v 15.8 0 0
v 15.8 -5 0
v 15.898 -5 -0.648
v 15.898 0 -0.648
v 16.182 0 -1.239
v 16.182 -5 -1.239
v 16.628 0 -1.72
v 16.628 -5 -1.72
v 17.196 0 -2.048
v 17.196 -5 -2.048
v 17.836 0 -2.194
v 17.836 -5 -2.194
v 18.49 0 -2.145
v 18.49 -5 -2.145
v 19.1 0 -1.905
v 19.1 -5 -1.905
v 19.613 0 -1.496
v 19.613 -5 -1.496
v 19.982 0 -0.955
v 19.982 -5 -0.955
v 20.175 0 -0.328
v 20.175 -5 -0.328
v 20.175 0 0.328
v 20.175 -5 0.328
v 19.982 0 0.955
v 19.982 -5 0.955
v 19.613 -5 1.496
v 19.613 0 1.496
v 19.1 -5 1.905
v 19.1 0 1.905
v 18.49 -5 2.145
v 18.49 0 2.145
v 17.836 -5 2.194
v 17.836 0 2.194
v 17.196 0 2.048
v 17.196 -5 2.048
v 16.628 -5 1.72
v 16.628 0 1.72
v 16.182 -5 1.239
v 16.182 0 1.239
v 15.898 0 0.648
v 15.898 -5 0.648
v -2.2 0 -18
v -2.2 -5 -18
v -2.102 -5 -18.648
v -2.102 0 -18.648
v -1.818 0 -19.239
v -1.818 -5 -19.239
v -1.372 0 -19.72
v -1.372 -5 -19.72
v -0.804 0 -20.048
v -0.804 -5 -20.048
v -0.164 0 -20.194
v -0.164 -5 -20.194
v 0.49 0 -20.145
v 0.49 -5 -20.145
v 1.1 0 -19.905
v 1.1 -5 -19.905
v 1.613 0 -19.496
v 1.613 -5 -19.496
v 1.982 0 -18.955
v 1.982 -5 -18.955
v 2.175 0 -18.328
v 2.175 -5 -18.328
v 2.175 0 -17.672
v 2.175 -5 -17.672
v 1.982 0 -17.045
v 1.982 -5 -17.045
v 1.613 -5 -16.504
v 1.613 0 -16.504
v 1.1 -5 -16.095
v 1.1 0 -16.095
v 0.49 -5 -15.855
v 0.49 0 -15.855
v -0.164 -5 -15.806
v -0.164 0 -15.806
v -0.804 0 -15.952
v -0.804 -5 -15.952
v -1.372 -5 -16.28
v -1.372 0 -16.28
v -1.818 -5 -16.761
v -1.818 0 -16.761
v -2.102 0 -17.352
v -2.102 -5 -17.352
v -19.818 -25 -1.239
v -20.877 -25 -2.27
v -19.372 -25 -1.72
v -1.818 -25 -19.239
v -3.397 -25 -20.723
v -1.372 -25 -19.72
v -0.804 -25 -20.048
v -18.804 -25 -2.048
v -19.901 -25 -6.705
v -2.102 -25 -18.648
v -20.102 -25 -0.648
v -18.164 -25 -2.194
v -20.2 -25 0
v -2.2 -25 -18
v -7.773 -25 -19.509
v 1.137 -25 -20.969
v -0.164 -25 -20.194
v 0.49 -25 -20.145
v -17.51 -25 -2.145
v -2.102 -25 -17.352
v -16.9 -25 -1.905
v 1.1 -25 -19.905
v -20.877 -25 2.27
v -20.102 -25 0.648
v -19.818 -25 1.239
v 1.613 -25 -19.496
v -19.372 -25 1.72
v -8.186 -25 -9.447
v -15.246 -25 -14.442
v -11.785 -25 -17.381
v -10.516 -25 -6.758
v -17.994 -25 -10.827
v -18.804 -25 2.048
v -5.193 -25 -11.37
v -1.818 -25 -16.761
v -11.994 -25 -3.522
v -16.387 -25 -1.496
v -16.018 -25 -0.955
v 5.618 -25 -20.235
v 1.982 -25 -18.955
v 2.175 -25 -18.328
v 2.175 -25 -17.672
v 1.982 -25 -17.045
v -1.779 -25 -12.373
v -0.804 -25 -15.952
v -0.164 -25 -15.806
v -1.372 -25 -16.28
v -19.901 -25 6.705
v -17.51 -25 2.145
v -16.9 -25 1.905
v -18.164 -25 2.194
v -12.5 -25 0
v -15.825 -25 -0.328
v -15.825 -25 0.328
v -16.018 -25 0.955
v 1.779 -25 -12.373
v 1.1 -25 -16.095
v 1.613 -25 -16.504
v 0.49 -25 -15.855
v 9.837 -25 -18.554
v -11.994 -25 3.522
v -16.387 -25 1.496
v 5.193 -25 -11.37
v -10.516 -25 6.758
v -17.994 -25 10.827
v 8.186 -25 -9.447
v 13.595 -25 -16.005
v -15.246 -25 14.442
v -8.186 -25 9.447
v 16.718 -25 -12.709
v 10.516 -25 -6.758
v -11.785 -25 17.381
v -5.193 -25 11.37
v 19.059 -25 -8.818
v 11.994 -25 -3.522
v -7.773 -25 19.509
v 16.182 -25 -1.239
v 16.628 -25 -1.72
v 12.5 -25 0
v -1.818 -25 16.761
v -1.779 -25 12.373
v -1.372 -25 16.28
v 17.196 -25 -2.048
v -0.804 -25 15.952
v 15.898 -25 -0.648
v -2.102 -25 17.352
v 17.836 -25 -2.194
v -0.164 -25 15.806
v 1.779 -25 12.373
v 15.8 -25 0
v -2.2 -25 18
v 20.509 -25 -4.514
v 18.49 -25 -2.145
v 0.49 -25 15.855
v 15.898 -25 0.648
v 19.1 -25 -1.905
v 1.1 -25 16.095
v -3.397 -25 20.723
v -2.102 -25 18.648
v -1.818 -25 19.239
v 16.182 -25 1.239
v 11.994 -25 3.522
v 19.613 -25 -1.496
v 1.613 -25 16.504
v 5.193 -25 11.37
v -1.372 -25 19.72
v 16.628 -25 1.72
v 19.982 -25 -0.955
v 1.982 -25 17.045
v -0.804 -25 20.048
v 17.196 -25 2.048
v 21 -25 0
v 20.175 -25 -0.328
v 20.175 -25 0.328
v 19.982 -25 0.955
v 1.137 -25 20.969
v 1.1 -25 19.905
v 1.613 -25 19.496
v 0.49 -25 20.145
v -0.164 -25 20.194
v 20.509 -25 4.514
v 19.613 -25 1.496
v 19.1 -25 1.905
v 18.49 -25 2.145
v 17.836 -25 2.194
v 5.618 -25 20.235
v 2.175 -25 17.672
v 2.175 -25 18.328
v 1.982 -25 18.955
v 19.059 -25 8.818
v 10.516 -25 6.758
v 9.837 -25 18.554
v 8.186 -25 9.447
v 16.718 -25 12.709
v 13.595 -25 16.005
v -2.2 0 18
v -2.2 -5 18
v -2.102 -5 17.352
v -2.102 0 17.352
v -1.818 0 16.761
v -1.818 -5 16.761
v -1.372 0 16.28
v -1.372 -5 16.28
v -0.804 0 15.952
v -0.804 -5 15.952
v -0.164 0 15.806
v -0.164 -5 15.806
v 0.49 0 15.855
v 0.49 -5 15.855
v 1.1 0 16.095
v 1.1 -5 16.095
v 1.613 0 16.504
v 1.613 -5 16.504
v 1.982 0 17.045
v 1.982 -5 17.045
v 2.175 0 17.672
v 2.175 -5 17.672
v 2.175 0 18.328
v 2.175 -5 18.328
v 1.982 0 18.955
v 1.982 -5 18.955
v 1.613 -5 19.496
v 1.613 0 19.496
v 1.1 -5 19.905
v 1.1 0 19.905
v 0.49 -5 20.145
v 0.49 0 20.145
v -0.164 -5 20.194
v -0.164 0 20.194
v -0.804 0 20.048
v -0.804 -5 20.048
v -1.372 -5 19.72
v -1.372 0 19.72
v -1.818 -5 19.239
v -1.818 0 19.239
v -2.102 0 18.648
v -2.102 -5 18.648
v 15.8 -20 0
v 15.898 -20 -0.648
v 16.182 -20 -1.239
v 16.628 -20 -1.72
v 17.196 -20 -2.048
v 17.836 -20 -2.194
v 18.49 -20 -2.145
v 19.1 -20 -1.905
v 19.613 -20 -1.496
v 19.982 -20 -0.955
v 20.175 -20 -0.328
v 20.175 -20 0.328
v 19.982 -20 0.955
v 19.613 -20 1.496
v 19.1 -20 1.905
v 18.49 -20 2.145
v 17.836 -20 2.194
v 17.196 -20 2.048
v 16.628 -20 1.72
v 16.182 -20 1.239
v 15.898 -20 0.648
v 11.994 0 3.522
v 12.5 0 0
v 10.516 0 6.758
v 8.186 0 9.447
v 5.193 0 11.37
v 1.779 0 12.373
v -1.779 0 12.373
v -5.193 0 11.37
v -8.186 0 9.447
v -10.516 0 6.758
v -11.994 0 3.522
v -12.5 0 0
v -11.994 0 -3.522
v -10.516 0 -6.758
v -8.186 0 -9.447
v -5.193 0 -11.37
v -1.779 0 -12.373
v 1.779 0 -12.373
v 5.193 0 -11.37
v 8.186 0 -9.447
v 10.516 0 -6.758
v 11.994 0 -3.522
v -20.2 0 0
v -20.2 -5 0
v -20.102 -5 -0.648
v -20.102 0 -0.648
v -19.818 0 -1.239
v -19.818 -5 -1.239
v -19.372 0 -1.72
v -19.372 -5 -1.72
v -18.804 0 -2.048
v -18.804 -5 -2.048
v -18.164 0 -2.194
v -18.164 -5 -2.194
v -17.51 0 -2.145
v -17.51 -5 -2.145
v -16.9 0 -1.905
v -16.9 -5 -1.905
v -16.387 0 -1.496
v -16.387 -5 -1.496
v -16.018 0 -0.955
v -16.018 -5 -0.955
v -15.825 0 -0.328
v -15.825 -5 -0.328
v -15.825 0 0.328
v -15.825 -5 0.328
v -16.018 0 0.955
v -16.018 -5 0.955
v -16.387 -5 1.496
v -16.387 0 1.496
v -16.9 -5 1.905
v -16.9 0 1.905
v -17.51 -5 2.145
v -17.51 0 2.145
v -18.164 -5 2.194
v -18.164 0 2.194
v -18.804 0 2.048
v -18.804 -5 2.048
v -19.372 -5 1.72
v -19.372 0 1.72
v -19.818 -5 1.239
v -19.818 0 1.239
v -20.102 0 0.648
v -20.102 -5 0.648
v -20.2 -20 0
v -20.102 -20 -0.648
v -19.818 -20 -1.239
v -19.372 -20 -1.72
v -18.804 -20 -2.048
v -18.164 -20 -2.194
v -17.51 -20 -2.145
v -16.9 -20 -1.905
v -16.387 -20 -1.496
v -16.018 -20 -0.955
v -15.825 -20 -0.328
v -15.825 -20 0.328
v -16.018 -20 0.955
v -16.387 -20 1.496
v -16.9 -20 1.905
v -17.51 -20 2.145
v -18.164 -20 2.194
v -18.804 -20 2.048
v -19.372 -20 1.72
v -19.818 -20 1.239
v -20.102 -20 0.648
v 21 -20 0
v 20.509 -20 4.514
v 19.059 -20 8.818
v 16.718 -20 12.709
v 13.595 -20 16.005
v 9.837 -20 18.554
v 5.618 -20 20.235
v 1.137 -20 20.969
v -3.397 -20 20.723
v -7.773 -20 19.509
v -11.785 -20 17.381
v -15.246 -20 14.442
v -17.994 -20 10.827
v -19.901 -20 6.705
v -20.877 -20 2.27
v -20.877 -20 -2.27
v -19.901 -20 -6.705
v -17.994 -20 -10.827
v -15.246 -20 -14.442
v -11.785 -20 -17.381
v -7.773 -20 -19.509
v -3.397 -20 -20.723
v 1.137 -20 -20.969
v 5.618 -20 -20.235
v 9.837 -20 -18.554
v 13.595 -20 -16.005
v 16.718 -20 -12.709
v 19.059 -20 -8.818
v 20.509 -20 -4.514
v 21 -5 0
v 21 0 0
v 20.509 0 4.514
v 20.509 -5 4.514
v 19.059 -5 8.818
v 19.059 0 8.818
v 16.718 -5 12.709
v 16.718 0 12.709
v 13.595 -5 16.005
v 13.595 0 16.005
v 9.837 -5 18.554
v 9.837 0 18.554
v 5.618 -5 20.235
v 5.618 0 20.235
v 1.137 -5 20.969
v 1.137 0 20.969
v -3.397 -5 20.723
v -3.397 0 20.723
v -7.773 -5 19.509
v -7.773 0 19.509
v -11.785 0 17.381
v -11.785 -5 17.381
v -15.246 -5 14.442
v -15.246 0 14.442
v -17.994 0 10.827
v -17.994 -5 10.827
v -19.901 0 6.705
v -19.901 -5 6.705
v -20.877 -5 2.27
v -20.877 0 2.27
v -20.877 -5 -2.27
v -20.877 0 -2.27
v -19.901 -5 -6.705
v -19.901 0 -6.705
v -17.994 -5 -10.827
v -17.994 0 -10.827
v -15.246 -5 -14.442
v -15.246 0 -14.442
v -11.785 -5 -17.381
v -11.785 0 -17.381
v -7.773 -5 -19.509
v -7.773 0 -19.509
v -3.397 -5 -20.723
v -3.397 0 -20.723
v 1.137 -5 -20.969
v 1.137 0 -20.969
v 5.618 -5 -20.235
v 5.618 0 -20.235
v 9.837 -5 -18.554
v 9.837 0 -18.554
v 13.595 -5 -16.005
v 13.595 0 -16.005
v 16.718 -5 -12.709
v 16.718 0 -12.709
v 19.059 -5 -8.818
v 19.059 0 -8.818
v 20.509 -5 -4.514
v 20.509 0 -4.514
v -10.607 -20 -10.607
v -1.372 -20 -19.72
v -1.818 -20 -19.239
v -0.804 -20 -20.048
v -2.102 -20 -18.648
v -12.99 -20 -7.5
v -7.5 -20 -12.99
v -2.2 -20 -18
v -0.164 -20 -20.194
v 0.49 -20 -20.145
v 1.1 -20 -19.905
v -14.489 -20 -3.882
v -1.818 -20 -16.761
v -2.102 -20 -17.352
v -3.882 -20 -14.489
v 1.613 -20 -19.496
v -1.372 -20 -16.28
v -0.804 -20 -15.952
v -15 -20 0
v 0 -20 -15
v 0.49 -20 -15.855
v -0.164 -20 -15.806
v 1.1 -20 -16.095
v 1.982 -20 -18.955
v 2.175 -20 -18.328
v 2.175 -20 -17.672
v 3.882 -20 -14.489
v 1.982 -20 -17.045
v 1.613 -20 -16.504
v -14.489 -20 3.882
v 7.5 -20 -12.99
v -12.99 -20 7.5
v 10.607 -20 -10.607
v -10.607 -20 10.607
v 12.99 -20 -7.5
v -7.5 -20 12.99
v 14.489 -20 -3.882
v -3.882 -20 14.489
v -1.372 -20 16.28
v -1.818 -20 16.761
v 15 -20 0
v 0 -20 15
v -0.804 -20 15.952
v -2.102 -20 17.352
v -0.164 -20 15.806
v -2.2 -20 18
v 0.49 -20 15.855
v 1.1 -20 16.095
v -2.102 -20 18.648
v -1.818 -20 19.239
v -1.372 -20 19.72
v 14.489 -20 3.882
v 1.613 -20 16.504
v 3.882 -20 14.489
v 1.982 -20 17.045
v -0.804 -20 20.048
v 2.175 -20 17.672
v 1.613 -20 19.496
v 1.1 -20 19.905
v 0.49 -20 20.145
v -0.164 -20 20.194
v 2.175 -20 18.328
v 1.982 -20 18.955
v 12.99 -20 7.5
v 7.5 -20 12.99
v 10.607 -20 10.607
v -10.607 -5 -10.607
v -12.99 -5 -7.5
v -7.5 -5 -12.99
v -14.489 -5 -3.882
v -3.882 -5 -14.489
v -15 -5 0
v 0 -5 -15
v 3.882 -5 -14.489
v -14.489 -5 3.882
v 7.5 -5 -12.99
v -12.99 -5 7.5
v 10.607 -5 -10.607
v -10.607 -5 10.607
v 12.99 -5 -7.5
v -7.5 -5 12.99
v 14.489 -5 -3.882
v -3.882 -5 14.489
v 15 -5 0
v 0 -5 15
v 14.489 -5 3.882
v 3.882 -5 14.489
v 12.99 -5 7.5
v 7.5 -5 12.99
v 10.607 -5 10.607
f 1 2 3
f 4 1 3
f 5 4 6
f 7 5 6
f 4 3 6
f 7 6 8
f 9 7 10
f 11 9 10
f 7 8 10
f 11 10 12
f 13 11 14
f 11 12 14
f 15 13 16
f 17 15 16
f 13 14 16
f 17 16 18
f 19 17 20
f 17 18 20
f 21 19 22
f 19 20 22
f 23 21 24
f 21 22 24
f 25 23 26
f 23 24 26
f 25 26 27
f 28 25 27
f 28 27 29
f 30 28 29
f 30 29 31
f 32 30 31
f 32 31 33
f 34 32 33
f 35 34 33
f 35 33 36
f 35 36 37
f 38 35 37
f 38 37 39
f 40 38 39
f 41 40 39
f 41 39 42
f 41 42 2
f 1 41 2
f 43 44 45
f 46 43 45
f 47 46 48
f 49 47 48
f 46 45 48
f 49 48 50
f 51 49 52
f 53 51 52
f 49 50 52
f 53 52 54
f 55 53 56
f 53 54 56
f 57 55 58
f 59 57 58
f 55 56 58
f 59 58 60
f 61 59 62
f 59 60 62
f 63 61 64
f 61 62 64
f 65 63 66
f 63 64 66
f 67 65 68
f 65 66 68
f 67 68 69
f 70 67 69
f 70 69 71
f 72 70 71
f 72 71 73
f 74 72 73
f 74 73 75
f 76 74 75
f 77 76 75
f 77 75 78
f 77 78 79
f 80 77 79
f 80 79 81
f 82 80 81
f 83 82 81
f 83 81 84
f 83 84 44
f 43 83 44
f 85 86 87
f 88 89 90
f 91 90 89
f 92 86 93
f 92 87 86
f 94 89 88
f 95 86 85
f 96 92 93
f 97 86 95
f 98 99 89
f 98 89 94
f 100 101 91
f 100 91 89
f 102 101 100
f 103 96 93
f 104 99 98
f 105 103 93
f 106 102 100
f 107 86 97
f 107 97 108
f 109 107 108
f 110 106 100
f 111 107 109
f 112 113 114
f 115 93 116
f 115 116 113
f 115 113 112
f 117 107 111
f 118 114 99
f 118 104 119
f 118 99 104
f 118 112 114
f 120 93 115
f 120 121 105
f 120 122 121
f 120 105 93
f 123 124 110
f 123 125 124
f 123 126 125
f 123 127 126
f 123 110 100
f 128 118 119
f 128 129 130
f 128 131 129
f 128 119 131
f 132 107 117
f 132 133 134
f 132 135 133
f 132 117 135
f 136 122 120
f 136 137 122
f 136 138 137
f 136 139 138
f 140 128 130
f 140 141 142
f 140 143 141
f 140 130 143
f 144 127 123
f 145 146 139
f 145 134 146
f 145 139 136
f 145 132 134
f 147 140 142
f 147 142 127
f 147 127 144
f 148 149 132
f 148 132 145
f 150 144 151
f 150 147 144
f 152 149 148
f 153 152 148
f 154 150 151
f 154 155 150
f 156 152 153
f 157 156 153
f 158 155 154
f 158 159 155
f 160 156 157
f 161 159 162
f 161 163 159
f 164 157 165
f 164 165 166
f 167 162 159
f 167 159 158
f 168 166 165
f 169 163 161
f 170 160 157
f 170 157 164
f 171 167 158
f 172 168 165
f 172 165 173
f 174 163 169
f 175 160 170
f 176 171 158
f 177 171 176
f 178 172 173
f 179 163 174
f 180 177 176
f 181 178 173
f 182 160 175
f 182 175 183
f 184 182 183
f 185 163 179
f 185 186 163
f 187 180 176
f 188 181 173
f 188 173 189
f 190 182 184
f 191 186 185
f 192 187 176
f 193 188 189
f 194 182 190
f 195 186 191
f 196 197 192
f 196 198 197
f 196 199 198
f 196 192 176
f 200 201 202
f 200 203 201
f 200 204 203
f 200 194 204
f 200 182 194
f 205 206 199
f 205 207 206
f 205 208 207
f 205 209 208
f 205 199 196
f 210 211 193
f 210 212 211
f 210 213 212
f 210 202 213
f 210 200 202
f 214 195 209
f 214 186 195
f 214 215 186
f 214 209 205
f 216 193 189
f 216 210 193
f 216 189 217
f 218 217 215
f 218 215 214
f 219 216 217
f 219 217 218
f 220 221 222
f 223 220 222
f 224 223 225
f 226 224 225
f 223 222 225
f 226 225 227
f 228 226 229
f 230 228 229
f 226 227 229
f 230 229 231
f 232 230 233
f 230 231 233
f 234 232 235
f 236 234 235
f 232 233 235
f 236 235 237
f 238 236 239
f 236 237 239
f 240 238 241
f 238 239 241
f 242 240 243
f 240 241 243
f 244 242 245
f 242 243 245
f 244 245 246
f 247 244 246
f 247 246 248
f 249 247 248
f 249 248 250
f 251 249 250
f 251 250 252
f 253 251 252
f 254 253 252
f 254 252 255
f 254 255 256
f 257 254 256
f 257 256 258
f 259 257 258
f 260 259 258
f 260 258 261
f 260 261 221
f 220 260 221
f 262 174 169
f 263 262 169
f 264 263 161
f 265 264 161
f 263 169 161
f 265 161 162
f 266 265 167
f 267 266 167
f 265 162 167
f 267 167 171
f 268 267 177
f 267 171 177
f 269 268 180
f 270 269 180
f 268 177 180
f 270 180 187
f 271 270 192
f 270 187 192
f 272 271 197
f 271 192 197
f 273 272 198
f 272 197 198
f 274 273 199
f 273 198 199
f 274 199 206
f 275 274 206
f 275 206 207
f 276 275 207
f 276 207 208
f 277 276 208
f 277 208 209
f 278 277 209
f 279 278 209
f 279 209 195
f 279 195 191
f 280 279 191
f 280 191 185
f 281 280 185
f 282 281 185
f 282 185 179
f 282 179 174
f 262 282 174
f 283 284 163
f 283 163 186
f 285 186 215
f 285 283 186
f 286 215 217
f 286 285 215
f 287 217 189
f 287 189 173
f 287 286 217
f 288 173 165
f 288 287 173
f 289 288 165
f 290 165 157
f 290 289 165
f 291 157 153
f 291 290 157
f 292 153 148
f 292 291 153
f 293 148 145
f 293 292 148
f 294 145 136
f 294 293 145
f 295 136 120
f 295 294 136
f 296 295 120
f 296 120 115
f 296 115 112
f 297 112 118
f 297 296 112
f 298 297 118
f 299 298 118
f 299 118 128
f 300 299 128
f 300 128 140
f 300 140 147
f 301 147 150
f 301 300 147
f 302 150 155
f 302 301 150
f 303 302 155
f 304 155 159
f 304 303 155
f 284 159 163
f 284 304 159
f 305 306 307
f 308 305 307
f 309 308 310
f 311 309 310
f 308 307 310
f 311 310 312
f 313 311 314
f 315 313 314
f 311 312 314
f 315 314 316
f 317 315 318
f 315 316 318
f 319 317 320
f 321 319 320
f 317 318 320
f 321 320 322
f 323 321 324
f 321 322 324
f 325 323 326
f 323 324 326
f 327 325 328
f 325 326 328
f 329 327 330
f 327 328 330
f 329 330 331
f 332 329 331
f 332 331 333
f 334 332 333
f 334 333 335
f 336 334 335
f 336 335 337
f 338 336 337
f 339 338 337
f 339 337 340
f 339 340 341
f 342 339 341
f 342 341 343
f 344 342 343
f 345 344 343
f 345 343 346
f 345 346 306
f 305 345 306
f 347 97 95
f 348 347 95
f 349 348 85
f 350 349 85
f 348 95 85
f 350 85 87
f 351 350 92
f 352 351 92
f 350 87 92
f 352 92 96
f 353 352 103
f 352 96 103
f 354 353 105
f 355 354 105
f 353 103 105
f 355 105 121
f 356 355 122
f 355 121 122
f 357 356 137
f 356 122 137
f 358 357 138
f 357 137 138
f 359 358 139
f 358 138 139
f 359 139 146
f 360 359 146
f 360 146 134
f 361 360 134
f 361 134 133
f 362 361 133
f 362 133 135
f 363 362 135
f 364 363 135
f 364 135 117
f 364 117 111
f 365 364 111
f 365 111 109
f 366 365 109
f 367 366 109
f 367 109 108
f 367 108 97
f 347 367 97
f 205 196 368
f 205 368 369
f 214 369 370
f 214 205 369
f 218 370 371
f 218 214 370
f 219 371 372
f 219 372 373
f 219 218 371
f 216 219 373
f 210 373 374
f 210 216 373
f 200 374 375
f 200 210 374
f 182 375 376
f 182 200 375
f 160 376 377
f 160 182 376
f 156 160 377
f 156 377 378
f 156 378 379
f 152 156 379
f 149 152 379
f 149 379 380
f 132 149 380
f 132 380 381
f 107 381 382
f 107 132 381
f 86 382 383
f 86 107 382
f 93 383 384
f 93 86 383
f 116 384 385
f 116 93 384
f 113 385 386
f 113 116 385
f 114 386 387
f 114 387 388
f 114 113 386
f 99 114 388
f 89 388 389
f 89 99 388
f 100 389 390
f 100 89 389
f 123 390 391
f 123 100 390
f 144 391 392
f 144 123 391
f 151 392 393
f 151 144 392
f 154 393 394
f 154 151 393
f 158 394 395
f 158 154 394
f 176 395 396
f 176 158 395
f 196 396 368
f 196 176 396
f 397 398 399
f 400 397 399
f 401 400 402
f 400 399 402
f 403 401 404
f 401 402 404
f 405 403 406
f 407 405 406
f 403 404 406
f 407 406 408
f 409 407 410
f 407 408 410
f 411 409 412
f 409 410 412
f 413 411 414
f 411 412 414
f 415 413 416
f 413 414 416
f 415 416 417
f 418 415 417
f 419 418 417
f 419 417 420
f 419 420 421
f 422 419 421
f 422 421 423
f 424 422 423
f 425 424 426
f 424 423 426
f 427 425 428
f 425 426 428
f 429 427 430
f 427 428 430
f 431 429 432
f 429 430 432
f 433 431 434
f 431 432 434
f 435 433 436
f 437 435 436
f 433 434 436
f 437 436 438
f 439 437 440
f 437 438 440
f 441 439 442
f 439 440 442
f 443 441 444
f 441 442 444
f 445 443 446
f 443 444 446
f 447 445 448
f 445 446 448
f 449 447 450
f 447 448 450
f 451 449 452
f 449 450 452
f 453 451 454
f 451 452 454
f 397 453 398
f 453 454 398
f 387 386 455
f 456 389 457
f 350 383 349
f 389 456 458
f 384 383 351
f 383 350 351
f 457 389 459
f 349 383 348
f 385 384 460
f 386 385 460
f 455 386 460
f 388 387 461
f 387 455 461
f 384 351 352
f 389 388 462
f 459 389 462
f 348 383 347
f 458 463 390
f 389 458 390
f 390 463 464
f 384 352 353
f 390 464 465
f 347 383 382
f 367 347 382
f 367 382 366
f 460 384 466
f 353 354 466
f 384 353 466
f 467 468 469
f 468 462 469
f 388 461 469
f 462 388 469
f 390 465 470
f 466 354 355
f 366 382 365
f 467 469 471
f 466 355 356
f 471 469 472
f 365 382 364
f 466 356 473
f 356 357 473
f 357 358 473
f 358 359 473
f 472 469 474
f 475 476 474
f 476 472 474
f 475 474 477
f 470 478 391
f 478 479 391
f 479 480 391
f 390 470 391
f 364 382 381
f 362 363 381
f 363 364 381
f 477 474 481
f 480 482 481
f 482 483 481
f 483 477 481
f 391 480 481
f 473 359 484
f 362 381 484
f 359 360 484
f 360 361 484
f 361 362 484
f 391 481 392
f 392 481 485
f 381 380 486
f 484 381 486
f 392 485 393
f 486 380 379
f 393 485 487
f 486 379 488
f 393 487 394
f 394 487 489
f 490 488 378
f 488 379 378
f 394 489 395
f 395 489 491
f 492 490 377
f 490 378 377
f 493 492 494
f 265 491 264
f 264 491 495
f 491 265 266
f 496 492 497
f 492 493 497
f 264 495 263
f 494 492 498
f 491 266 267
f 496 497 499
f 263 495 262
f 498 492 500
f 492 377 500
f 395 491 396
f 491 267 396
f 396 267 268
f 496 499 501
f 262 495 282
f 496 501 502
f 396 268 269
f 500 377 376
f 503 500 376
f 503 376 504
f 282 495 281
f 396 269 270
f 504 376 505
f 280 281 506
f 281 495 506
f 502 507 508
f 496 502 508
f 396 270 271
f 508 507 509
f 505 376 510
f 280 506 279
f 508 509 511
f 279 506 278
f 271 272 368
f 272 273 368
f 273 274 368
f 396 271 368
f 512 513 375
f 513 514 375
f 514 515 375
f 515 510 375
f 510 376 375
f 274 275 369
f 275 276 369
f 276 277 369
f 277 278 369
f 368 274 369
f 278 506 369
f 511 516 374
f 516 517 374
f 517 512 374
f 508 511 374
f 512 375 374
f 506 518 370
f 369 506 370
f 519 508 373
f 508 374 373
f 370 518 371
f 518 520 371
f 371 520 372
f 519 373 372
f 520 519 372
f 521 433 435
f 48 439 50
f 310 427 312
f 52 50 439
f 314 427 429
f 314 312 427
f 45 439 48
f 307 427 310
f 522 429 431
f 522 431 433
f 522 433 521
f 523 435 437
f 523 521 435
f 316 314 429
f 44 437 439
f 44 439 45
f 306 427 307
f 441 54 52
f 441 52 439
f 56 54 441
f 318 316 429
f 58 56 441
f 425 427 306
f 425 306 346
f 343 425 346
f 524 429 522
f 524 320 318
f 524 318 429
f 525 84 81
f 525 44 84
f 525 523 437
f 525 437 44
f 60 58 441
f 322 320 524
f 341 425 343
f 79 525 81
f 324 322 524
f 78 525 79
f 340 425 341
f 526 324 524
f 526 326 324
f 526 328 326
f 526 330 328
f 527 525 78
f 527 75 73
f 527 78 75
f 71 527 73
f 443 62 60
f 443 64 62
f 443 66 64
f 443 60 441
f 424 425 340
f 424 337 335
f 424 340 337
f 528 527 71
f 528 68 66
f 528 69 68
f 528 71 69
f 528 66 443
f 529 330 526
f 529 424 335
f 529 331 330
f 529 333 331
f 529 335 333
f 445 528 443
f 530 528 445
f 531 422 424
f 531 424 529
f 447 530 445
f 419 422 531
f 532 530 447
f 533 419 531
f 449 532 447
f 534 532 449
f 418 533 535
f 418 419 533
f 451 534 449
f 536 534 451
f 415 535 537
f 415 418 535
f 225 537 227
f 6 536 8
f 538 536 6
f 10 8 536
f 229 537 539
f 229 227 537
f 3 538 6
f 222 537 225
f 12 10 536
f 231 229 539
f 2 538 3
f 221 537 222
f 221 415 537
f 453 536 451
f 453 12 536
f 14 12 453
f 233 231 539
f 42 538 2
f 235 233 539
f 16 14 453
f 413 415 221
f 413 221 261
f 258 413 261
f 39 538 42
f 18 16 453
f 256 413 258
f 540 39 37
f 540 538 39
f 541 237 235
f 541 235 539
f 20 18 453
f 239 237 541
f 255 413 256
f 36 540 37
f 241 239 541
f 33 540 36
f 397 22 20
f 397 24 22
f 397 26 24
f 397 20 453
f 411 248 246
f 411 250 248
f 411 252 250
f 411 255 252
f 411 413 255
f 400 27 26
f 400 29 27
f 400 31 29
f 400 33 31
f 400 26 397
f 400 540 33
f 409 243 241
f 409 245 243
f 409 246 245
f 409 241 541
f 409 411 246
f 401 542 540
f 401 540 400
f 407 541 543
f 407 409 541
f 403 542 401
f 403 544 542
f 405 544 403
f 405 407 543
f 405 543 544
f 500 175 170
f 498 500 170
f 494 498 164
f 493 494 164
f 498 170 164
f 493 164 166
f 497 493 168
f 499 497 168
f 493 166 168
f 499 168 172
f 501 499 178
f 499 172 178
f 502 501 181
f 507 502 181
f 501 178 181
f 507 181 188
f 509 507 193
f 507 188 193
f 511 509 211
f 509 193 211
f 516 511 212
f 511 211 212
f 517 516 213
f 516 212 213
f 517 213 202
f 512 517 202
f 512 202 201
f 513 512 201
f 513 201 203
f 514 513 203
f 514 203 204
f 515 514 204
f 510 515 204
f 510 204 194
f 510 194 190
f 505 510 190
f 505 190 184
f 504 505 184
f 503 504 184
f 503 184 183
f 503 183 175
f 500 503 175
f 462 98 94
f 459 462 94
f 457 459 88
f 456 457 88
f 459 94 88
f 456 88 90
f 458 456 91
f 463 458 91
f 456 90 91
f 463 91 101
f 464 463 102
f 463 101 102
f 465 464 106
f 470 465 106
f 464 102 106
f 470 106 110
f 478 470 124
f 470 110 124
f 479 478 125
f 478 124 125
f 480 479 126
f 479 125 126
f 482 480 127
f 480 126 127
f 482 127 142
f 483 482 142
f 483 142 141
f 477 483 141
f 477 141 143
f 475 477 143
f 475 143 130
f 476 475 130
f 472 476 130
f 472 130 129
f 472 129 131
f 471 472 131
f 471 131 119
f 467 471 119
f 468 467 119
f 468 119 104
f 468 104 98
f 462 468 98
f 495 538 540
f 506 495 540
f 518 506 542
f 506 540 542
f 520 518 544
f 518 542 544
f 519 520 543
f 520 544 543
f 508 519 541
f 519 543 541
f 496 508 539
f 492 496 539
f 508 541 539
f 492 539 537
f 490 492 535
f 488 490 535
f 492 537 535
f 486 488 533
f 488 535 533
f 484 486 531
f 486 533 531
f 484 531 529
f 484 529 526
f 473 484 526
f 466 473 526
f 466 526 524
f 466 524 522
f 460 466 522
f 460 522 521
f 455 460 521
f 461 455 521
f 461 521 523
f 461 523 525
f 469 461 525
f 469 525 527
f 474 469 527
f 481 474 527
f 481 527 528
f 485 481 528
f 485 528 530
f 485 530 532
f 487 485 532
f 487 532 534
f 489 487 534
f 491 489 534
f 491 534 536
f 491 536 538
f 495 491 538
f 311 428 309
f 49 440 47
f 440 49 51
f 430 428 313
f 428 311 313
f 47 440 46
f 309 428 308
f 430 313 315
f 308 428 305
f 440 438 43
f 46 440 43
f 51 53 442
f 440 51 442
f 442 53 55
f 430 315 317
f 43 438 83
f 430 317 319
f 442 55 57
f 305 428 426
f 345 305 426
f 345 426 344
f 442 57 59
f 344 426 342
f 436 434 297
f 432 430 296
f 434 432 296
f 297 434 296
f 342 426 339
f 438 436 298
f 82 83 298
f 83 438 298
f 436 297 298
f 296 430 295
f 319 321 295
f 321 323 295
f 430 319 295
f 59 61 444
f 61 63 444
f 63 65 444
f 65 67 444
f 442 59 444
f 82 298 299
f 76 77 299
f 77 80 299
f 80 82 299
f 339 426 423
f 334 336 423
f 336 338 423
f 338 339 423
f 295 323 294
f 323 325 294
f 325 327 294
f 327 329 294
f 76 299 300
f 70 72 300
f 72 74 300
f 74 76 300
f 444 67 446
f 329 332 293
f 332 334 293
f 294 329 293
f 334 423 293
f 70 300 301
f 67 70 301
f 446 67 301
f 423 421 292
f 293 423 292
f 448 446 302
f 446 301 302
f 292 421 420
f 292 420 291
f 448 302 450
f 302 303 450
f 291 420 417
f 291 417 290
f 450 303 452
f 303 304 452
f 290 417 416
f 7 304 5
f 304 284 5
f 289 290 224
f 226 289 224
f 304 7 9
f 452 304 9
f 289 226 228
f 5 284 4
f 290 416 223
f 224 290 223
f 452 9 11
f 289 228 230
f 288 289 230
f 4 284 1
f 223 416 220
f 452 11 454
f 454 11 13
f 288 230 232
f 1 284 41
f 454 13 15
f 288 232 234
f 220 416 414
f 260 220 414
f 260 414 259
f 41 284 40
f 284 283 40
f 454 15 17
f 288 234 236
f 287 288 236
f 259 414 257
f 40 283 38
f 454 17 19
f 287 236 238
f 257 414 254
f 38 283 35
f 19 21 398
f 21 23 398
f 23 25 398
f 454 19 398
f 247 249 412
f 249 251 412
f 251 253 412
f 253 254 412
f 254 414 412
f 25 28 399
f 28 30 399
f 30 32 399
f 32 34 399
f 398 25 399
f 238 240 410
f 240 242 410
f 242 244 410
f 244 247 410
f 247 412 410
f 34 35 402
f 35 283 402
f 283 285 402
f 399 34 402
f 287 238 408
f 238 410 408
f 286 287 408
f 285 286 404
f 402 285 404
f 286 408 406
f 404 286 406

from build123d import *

# Parameters (mm, degrees)
F0_R     = 15
F0_R_2   = 12.5
F1_DEPTH = 25
F0_R_3   = 21
F3_DEPTH = 5
F4_R     = 21
F4_R_2   = 15
F5_DEPTH = 5
F6_D     = 4.4


# Not quite as in the source:
# - the program builds the solid bodies; features that only make, move or delete a surface that nothing else refers to are left out


with BuildPart() as f1:
    # F0 (on Front) → F1 (new body)
    with BuildSketch(Plane.XZ):
        Circle(F0_R)
        Circle(F0_R_2, mode=Mode.SUBTRACT)
    extrude(amount=F1_DEPTH)

    # F0 (on Front) → F3 (join)
    with BuildSketch(Plane.XZ):
        Circle(F0_R_3)
        Circle(F0_R, mode=Mode.SUBTRACT)
    extrude(amount=F3_DEPTH)

    # F4 (on face) → F5 (join)
    with BuildSketch(Plane.XZ.offset(25)):
        Circle(F4_R)
        Circle(F4_R_2, mode=Mode.SUBTRACT)
    extrude(amount=-F5_DEPTH)

    # F6 (through all)
    with Locations(Plane(origin=(0, 0, 0), x_dir=(1, 0, 0), z_dir=(0, 1, 0))):
        with Locations((-18, 0), (0, 18), (18, 0), (0, -18)):
            Hole(F6_D / 2)


solid = f1.part
